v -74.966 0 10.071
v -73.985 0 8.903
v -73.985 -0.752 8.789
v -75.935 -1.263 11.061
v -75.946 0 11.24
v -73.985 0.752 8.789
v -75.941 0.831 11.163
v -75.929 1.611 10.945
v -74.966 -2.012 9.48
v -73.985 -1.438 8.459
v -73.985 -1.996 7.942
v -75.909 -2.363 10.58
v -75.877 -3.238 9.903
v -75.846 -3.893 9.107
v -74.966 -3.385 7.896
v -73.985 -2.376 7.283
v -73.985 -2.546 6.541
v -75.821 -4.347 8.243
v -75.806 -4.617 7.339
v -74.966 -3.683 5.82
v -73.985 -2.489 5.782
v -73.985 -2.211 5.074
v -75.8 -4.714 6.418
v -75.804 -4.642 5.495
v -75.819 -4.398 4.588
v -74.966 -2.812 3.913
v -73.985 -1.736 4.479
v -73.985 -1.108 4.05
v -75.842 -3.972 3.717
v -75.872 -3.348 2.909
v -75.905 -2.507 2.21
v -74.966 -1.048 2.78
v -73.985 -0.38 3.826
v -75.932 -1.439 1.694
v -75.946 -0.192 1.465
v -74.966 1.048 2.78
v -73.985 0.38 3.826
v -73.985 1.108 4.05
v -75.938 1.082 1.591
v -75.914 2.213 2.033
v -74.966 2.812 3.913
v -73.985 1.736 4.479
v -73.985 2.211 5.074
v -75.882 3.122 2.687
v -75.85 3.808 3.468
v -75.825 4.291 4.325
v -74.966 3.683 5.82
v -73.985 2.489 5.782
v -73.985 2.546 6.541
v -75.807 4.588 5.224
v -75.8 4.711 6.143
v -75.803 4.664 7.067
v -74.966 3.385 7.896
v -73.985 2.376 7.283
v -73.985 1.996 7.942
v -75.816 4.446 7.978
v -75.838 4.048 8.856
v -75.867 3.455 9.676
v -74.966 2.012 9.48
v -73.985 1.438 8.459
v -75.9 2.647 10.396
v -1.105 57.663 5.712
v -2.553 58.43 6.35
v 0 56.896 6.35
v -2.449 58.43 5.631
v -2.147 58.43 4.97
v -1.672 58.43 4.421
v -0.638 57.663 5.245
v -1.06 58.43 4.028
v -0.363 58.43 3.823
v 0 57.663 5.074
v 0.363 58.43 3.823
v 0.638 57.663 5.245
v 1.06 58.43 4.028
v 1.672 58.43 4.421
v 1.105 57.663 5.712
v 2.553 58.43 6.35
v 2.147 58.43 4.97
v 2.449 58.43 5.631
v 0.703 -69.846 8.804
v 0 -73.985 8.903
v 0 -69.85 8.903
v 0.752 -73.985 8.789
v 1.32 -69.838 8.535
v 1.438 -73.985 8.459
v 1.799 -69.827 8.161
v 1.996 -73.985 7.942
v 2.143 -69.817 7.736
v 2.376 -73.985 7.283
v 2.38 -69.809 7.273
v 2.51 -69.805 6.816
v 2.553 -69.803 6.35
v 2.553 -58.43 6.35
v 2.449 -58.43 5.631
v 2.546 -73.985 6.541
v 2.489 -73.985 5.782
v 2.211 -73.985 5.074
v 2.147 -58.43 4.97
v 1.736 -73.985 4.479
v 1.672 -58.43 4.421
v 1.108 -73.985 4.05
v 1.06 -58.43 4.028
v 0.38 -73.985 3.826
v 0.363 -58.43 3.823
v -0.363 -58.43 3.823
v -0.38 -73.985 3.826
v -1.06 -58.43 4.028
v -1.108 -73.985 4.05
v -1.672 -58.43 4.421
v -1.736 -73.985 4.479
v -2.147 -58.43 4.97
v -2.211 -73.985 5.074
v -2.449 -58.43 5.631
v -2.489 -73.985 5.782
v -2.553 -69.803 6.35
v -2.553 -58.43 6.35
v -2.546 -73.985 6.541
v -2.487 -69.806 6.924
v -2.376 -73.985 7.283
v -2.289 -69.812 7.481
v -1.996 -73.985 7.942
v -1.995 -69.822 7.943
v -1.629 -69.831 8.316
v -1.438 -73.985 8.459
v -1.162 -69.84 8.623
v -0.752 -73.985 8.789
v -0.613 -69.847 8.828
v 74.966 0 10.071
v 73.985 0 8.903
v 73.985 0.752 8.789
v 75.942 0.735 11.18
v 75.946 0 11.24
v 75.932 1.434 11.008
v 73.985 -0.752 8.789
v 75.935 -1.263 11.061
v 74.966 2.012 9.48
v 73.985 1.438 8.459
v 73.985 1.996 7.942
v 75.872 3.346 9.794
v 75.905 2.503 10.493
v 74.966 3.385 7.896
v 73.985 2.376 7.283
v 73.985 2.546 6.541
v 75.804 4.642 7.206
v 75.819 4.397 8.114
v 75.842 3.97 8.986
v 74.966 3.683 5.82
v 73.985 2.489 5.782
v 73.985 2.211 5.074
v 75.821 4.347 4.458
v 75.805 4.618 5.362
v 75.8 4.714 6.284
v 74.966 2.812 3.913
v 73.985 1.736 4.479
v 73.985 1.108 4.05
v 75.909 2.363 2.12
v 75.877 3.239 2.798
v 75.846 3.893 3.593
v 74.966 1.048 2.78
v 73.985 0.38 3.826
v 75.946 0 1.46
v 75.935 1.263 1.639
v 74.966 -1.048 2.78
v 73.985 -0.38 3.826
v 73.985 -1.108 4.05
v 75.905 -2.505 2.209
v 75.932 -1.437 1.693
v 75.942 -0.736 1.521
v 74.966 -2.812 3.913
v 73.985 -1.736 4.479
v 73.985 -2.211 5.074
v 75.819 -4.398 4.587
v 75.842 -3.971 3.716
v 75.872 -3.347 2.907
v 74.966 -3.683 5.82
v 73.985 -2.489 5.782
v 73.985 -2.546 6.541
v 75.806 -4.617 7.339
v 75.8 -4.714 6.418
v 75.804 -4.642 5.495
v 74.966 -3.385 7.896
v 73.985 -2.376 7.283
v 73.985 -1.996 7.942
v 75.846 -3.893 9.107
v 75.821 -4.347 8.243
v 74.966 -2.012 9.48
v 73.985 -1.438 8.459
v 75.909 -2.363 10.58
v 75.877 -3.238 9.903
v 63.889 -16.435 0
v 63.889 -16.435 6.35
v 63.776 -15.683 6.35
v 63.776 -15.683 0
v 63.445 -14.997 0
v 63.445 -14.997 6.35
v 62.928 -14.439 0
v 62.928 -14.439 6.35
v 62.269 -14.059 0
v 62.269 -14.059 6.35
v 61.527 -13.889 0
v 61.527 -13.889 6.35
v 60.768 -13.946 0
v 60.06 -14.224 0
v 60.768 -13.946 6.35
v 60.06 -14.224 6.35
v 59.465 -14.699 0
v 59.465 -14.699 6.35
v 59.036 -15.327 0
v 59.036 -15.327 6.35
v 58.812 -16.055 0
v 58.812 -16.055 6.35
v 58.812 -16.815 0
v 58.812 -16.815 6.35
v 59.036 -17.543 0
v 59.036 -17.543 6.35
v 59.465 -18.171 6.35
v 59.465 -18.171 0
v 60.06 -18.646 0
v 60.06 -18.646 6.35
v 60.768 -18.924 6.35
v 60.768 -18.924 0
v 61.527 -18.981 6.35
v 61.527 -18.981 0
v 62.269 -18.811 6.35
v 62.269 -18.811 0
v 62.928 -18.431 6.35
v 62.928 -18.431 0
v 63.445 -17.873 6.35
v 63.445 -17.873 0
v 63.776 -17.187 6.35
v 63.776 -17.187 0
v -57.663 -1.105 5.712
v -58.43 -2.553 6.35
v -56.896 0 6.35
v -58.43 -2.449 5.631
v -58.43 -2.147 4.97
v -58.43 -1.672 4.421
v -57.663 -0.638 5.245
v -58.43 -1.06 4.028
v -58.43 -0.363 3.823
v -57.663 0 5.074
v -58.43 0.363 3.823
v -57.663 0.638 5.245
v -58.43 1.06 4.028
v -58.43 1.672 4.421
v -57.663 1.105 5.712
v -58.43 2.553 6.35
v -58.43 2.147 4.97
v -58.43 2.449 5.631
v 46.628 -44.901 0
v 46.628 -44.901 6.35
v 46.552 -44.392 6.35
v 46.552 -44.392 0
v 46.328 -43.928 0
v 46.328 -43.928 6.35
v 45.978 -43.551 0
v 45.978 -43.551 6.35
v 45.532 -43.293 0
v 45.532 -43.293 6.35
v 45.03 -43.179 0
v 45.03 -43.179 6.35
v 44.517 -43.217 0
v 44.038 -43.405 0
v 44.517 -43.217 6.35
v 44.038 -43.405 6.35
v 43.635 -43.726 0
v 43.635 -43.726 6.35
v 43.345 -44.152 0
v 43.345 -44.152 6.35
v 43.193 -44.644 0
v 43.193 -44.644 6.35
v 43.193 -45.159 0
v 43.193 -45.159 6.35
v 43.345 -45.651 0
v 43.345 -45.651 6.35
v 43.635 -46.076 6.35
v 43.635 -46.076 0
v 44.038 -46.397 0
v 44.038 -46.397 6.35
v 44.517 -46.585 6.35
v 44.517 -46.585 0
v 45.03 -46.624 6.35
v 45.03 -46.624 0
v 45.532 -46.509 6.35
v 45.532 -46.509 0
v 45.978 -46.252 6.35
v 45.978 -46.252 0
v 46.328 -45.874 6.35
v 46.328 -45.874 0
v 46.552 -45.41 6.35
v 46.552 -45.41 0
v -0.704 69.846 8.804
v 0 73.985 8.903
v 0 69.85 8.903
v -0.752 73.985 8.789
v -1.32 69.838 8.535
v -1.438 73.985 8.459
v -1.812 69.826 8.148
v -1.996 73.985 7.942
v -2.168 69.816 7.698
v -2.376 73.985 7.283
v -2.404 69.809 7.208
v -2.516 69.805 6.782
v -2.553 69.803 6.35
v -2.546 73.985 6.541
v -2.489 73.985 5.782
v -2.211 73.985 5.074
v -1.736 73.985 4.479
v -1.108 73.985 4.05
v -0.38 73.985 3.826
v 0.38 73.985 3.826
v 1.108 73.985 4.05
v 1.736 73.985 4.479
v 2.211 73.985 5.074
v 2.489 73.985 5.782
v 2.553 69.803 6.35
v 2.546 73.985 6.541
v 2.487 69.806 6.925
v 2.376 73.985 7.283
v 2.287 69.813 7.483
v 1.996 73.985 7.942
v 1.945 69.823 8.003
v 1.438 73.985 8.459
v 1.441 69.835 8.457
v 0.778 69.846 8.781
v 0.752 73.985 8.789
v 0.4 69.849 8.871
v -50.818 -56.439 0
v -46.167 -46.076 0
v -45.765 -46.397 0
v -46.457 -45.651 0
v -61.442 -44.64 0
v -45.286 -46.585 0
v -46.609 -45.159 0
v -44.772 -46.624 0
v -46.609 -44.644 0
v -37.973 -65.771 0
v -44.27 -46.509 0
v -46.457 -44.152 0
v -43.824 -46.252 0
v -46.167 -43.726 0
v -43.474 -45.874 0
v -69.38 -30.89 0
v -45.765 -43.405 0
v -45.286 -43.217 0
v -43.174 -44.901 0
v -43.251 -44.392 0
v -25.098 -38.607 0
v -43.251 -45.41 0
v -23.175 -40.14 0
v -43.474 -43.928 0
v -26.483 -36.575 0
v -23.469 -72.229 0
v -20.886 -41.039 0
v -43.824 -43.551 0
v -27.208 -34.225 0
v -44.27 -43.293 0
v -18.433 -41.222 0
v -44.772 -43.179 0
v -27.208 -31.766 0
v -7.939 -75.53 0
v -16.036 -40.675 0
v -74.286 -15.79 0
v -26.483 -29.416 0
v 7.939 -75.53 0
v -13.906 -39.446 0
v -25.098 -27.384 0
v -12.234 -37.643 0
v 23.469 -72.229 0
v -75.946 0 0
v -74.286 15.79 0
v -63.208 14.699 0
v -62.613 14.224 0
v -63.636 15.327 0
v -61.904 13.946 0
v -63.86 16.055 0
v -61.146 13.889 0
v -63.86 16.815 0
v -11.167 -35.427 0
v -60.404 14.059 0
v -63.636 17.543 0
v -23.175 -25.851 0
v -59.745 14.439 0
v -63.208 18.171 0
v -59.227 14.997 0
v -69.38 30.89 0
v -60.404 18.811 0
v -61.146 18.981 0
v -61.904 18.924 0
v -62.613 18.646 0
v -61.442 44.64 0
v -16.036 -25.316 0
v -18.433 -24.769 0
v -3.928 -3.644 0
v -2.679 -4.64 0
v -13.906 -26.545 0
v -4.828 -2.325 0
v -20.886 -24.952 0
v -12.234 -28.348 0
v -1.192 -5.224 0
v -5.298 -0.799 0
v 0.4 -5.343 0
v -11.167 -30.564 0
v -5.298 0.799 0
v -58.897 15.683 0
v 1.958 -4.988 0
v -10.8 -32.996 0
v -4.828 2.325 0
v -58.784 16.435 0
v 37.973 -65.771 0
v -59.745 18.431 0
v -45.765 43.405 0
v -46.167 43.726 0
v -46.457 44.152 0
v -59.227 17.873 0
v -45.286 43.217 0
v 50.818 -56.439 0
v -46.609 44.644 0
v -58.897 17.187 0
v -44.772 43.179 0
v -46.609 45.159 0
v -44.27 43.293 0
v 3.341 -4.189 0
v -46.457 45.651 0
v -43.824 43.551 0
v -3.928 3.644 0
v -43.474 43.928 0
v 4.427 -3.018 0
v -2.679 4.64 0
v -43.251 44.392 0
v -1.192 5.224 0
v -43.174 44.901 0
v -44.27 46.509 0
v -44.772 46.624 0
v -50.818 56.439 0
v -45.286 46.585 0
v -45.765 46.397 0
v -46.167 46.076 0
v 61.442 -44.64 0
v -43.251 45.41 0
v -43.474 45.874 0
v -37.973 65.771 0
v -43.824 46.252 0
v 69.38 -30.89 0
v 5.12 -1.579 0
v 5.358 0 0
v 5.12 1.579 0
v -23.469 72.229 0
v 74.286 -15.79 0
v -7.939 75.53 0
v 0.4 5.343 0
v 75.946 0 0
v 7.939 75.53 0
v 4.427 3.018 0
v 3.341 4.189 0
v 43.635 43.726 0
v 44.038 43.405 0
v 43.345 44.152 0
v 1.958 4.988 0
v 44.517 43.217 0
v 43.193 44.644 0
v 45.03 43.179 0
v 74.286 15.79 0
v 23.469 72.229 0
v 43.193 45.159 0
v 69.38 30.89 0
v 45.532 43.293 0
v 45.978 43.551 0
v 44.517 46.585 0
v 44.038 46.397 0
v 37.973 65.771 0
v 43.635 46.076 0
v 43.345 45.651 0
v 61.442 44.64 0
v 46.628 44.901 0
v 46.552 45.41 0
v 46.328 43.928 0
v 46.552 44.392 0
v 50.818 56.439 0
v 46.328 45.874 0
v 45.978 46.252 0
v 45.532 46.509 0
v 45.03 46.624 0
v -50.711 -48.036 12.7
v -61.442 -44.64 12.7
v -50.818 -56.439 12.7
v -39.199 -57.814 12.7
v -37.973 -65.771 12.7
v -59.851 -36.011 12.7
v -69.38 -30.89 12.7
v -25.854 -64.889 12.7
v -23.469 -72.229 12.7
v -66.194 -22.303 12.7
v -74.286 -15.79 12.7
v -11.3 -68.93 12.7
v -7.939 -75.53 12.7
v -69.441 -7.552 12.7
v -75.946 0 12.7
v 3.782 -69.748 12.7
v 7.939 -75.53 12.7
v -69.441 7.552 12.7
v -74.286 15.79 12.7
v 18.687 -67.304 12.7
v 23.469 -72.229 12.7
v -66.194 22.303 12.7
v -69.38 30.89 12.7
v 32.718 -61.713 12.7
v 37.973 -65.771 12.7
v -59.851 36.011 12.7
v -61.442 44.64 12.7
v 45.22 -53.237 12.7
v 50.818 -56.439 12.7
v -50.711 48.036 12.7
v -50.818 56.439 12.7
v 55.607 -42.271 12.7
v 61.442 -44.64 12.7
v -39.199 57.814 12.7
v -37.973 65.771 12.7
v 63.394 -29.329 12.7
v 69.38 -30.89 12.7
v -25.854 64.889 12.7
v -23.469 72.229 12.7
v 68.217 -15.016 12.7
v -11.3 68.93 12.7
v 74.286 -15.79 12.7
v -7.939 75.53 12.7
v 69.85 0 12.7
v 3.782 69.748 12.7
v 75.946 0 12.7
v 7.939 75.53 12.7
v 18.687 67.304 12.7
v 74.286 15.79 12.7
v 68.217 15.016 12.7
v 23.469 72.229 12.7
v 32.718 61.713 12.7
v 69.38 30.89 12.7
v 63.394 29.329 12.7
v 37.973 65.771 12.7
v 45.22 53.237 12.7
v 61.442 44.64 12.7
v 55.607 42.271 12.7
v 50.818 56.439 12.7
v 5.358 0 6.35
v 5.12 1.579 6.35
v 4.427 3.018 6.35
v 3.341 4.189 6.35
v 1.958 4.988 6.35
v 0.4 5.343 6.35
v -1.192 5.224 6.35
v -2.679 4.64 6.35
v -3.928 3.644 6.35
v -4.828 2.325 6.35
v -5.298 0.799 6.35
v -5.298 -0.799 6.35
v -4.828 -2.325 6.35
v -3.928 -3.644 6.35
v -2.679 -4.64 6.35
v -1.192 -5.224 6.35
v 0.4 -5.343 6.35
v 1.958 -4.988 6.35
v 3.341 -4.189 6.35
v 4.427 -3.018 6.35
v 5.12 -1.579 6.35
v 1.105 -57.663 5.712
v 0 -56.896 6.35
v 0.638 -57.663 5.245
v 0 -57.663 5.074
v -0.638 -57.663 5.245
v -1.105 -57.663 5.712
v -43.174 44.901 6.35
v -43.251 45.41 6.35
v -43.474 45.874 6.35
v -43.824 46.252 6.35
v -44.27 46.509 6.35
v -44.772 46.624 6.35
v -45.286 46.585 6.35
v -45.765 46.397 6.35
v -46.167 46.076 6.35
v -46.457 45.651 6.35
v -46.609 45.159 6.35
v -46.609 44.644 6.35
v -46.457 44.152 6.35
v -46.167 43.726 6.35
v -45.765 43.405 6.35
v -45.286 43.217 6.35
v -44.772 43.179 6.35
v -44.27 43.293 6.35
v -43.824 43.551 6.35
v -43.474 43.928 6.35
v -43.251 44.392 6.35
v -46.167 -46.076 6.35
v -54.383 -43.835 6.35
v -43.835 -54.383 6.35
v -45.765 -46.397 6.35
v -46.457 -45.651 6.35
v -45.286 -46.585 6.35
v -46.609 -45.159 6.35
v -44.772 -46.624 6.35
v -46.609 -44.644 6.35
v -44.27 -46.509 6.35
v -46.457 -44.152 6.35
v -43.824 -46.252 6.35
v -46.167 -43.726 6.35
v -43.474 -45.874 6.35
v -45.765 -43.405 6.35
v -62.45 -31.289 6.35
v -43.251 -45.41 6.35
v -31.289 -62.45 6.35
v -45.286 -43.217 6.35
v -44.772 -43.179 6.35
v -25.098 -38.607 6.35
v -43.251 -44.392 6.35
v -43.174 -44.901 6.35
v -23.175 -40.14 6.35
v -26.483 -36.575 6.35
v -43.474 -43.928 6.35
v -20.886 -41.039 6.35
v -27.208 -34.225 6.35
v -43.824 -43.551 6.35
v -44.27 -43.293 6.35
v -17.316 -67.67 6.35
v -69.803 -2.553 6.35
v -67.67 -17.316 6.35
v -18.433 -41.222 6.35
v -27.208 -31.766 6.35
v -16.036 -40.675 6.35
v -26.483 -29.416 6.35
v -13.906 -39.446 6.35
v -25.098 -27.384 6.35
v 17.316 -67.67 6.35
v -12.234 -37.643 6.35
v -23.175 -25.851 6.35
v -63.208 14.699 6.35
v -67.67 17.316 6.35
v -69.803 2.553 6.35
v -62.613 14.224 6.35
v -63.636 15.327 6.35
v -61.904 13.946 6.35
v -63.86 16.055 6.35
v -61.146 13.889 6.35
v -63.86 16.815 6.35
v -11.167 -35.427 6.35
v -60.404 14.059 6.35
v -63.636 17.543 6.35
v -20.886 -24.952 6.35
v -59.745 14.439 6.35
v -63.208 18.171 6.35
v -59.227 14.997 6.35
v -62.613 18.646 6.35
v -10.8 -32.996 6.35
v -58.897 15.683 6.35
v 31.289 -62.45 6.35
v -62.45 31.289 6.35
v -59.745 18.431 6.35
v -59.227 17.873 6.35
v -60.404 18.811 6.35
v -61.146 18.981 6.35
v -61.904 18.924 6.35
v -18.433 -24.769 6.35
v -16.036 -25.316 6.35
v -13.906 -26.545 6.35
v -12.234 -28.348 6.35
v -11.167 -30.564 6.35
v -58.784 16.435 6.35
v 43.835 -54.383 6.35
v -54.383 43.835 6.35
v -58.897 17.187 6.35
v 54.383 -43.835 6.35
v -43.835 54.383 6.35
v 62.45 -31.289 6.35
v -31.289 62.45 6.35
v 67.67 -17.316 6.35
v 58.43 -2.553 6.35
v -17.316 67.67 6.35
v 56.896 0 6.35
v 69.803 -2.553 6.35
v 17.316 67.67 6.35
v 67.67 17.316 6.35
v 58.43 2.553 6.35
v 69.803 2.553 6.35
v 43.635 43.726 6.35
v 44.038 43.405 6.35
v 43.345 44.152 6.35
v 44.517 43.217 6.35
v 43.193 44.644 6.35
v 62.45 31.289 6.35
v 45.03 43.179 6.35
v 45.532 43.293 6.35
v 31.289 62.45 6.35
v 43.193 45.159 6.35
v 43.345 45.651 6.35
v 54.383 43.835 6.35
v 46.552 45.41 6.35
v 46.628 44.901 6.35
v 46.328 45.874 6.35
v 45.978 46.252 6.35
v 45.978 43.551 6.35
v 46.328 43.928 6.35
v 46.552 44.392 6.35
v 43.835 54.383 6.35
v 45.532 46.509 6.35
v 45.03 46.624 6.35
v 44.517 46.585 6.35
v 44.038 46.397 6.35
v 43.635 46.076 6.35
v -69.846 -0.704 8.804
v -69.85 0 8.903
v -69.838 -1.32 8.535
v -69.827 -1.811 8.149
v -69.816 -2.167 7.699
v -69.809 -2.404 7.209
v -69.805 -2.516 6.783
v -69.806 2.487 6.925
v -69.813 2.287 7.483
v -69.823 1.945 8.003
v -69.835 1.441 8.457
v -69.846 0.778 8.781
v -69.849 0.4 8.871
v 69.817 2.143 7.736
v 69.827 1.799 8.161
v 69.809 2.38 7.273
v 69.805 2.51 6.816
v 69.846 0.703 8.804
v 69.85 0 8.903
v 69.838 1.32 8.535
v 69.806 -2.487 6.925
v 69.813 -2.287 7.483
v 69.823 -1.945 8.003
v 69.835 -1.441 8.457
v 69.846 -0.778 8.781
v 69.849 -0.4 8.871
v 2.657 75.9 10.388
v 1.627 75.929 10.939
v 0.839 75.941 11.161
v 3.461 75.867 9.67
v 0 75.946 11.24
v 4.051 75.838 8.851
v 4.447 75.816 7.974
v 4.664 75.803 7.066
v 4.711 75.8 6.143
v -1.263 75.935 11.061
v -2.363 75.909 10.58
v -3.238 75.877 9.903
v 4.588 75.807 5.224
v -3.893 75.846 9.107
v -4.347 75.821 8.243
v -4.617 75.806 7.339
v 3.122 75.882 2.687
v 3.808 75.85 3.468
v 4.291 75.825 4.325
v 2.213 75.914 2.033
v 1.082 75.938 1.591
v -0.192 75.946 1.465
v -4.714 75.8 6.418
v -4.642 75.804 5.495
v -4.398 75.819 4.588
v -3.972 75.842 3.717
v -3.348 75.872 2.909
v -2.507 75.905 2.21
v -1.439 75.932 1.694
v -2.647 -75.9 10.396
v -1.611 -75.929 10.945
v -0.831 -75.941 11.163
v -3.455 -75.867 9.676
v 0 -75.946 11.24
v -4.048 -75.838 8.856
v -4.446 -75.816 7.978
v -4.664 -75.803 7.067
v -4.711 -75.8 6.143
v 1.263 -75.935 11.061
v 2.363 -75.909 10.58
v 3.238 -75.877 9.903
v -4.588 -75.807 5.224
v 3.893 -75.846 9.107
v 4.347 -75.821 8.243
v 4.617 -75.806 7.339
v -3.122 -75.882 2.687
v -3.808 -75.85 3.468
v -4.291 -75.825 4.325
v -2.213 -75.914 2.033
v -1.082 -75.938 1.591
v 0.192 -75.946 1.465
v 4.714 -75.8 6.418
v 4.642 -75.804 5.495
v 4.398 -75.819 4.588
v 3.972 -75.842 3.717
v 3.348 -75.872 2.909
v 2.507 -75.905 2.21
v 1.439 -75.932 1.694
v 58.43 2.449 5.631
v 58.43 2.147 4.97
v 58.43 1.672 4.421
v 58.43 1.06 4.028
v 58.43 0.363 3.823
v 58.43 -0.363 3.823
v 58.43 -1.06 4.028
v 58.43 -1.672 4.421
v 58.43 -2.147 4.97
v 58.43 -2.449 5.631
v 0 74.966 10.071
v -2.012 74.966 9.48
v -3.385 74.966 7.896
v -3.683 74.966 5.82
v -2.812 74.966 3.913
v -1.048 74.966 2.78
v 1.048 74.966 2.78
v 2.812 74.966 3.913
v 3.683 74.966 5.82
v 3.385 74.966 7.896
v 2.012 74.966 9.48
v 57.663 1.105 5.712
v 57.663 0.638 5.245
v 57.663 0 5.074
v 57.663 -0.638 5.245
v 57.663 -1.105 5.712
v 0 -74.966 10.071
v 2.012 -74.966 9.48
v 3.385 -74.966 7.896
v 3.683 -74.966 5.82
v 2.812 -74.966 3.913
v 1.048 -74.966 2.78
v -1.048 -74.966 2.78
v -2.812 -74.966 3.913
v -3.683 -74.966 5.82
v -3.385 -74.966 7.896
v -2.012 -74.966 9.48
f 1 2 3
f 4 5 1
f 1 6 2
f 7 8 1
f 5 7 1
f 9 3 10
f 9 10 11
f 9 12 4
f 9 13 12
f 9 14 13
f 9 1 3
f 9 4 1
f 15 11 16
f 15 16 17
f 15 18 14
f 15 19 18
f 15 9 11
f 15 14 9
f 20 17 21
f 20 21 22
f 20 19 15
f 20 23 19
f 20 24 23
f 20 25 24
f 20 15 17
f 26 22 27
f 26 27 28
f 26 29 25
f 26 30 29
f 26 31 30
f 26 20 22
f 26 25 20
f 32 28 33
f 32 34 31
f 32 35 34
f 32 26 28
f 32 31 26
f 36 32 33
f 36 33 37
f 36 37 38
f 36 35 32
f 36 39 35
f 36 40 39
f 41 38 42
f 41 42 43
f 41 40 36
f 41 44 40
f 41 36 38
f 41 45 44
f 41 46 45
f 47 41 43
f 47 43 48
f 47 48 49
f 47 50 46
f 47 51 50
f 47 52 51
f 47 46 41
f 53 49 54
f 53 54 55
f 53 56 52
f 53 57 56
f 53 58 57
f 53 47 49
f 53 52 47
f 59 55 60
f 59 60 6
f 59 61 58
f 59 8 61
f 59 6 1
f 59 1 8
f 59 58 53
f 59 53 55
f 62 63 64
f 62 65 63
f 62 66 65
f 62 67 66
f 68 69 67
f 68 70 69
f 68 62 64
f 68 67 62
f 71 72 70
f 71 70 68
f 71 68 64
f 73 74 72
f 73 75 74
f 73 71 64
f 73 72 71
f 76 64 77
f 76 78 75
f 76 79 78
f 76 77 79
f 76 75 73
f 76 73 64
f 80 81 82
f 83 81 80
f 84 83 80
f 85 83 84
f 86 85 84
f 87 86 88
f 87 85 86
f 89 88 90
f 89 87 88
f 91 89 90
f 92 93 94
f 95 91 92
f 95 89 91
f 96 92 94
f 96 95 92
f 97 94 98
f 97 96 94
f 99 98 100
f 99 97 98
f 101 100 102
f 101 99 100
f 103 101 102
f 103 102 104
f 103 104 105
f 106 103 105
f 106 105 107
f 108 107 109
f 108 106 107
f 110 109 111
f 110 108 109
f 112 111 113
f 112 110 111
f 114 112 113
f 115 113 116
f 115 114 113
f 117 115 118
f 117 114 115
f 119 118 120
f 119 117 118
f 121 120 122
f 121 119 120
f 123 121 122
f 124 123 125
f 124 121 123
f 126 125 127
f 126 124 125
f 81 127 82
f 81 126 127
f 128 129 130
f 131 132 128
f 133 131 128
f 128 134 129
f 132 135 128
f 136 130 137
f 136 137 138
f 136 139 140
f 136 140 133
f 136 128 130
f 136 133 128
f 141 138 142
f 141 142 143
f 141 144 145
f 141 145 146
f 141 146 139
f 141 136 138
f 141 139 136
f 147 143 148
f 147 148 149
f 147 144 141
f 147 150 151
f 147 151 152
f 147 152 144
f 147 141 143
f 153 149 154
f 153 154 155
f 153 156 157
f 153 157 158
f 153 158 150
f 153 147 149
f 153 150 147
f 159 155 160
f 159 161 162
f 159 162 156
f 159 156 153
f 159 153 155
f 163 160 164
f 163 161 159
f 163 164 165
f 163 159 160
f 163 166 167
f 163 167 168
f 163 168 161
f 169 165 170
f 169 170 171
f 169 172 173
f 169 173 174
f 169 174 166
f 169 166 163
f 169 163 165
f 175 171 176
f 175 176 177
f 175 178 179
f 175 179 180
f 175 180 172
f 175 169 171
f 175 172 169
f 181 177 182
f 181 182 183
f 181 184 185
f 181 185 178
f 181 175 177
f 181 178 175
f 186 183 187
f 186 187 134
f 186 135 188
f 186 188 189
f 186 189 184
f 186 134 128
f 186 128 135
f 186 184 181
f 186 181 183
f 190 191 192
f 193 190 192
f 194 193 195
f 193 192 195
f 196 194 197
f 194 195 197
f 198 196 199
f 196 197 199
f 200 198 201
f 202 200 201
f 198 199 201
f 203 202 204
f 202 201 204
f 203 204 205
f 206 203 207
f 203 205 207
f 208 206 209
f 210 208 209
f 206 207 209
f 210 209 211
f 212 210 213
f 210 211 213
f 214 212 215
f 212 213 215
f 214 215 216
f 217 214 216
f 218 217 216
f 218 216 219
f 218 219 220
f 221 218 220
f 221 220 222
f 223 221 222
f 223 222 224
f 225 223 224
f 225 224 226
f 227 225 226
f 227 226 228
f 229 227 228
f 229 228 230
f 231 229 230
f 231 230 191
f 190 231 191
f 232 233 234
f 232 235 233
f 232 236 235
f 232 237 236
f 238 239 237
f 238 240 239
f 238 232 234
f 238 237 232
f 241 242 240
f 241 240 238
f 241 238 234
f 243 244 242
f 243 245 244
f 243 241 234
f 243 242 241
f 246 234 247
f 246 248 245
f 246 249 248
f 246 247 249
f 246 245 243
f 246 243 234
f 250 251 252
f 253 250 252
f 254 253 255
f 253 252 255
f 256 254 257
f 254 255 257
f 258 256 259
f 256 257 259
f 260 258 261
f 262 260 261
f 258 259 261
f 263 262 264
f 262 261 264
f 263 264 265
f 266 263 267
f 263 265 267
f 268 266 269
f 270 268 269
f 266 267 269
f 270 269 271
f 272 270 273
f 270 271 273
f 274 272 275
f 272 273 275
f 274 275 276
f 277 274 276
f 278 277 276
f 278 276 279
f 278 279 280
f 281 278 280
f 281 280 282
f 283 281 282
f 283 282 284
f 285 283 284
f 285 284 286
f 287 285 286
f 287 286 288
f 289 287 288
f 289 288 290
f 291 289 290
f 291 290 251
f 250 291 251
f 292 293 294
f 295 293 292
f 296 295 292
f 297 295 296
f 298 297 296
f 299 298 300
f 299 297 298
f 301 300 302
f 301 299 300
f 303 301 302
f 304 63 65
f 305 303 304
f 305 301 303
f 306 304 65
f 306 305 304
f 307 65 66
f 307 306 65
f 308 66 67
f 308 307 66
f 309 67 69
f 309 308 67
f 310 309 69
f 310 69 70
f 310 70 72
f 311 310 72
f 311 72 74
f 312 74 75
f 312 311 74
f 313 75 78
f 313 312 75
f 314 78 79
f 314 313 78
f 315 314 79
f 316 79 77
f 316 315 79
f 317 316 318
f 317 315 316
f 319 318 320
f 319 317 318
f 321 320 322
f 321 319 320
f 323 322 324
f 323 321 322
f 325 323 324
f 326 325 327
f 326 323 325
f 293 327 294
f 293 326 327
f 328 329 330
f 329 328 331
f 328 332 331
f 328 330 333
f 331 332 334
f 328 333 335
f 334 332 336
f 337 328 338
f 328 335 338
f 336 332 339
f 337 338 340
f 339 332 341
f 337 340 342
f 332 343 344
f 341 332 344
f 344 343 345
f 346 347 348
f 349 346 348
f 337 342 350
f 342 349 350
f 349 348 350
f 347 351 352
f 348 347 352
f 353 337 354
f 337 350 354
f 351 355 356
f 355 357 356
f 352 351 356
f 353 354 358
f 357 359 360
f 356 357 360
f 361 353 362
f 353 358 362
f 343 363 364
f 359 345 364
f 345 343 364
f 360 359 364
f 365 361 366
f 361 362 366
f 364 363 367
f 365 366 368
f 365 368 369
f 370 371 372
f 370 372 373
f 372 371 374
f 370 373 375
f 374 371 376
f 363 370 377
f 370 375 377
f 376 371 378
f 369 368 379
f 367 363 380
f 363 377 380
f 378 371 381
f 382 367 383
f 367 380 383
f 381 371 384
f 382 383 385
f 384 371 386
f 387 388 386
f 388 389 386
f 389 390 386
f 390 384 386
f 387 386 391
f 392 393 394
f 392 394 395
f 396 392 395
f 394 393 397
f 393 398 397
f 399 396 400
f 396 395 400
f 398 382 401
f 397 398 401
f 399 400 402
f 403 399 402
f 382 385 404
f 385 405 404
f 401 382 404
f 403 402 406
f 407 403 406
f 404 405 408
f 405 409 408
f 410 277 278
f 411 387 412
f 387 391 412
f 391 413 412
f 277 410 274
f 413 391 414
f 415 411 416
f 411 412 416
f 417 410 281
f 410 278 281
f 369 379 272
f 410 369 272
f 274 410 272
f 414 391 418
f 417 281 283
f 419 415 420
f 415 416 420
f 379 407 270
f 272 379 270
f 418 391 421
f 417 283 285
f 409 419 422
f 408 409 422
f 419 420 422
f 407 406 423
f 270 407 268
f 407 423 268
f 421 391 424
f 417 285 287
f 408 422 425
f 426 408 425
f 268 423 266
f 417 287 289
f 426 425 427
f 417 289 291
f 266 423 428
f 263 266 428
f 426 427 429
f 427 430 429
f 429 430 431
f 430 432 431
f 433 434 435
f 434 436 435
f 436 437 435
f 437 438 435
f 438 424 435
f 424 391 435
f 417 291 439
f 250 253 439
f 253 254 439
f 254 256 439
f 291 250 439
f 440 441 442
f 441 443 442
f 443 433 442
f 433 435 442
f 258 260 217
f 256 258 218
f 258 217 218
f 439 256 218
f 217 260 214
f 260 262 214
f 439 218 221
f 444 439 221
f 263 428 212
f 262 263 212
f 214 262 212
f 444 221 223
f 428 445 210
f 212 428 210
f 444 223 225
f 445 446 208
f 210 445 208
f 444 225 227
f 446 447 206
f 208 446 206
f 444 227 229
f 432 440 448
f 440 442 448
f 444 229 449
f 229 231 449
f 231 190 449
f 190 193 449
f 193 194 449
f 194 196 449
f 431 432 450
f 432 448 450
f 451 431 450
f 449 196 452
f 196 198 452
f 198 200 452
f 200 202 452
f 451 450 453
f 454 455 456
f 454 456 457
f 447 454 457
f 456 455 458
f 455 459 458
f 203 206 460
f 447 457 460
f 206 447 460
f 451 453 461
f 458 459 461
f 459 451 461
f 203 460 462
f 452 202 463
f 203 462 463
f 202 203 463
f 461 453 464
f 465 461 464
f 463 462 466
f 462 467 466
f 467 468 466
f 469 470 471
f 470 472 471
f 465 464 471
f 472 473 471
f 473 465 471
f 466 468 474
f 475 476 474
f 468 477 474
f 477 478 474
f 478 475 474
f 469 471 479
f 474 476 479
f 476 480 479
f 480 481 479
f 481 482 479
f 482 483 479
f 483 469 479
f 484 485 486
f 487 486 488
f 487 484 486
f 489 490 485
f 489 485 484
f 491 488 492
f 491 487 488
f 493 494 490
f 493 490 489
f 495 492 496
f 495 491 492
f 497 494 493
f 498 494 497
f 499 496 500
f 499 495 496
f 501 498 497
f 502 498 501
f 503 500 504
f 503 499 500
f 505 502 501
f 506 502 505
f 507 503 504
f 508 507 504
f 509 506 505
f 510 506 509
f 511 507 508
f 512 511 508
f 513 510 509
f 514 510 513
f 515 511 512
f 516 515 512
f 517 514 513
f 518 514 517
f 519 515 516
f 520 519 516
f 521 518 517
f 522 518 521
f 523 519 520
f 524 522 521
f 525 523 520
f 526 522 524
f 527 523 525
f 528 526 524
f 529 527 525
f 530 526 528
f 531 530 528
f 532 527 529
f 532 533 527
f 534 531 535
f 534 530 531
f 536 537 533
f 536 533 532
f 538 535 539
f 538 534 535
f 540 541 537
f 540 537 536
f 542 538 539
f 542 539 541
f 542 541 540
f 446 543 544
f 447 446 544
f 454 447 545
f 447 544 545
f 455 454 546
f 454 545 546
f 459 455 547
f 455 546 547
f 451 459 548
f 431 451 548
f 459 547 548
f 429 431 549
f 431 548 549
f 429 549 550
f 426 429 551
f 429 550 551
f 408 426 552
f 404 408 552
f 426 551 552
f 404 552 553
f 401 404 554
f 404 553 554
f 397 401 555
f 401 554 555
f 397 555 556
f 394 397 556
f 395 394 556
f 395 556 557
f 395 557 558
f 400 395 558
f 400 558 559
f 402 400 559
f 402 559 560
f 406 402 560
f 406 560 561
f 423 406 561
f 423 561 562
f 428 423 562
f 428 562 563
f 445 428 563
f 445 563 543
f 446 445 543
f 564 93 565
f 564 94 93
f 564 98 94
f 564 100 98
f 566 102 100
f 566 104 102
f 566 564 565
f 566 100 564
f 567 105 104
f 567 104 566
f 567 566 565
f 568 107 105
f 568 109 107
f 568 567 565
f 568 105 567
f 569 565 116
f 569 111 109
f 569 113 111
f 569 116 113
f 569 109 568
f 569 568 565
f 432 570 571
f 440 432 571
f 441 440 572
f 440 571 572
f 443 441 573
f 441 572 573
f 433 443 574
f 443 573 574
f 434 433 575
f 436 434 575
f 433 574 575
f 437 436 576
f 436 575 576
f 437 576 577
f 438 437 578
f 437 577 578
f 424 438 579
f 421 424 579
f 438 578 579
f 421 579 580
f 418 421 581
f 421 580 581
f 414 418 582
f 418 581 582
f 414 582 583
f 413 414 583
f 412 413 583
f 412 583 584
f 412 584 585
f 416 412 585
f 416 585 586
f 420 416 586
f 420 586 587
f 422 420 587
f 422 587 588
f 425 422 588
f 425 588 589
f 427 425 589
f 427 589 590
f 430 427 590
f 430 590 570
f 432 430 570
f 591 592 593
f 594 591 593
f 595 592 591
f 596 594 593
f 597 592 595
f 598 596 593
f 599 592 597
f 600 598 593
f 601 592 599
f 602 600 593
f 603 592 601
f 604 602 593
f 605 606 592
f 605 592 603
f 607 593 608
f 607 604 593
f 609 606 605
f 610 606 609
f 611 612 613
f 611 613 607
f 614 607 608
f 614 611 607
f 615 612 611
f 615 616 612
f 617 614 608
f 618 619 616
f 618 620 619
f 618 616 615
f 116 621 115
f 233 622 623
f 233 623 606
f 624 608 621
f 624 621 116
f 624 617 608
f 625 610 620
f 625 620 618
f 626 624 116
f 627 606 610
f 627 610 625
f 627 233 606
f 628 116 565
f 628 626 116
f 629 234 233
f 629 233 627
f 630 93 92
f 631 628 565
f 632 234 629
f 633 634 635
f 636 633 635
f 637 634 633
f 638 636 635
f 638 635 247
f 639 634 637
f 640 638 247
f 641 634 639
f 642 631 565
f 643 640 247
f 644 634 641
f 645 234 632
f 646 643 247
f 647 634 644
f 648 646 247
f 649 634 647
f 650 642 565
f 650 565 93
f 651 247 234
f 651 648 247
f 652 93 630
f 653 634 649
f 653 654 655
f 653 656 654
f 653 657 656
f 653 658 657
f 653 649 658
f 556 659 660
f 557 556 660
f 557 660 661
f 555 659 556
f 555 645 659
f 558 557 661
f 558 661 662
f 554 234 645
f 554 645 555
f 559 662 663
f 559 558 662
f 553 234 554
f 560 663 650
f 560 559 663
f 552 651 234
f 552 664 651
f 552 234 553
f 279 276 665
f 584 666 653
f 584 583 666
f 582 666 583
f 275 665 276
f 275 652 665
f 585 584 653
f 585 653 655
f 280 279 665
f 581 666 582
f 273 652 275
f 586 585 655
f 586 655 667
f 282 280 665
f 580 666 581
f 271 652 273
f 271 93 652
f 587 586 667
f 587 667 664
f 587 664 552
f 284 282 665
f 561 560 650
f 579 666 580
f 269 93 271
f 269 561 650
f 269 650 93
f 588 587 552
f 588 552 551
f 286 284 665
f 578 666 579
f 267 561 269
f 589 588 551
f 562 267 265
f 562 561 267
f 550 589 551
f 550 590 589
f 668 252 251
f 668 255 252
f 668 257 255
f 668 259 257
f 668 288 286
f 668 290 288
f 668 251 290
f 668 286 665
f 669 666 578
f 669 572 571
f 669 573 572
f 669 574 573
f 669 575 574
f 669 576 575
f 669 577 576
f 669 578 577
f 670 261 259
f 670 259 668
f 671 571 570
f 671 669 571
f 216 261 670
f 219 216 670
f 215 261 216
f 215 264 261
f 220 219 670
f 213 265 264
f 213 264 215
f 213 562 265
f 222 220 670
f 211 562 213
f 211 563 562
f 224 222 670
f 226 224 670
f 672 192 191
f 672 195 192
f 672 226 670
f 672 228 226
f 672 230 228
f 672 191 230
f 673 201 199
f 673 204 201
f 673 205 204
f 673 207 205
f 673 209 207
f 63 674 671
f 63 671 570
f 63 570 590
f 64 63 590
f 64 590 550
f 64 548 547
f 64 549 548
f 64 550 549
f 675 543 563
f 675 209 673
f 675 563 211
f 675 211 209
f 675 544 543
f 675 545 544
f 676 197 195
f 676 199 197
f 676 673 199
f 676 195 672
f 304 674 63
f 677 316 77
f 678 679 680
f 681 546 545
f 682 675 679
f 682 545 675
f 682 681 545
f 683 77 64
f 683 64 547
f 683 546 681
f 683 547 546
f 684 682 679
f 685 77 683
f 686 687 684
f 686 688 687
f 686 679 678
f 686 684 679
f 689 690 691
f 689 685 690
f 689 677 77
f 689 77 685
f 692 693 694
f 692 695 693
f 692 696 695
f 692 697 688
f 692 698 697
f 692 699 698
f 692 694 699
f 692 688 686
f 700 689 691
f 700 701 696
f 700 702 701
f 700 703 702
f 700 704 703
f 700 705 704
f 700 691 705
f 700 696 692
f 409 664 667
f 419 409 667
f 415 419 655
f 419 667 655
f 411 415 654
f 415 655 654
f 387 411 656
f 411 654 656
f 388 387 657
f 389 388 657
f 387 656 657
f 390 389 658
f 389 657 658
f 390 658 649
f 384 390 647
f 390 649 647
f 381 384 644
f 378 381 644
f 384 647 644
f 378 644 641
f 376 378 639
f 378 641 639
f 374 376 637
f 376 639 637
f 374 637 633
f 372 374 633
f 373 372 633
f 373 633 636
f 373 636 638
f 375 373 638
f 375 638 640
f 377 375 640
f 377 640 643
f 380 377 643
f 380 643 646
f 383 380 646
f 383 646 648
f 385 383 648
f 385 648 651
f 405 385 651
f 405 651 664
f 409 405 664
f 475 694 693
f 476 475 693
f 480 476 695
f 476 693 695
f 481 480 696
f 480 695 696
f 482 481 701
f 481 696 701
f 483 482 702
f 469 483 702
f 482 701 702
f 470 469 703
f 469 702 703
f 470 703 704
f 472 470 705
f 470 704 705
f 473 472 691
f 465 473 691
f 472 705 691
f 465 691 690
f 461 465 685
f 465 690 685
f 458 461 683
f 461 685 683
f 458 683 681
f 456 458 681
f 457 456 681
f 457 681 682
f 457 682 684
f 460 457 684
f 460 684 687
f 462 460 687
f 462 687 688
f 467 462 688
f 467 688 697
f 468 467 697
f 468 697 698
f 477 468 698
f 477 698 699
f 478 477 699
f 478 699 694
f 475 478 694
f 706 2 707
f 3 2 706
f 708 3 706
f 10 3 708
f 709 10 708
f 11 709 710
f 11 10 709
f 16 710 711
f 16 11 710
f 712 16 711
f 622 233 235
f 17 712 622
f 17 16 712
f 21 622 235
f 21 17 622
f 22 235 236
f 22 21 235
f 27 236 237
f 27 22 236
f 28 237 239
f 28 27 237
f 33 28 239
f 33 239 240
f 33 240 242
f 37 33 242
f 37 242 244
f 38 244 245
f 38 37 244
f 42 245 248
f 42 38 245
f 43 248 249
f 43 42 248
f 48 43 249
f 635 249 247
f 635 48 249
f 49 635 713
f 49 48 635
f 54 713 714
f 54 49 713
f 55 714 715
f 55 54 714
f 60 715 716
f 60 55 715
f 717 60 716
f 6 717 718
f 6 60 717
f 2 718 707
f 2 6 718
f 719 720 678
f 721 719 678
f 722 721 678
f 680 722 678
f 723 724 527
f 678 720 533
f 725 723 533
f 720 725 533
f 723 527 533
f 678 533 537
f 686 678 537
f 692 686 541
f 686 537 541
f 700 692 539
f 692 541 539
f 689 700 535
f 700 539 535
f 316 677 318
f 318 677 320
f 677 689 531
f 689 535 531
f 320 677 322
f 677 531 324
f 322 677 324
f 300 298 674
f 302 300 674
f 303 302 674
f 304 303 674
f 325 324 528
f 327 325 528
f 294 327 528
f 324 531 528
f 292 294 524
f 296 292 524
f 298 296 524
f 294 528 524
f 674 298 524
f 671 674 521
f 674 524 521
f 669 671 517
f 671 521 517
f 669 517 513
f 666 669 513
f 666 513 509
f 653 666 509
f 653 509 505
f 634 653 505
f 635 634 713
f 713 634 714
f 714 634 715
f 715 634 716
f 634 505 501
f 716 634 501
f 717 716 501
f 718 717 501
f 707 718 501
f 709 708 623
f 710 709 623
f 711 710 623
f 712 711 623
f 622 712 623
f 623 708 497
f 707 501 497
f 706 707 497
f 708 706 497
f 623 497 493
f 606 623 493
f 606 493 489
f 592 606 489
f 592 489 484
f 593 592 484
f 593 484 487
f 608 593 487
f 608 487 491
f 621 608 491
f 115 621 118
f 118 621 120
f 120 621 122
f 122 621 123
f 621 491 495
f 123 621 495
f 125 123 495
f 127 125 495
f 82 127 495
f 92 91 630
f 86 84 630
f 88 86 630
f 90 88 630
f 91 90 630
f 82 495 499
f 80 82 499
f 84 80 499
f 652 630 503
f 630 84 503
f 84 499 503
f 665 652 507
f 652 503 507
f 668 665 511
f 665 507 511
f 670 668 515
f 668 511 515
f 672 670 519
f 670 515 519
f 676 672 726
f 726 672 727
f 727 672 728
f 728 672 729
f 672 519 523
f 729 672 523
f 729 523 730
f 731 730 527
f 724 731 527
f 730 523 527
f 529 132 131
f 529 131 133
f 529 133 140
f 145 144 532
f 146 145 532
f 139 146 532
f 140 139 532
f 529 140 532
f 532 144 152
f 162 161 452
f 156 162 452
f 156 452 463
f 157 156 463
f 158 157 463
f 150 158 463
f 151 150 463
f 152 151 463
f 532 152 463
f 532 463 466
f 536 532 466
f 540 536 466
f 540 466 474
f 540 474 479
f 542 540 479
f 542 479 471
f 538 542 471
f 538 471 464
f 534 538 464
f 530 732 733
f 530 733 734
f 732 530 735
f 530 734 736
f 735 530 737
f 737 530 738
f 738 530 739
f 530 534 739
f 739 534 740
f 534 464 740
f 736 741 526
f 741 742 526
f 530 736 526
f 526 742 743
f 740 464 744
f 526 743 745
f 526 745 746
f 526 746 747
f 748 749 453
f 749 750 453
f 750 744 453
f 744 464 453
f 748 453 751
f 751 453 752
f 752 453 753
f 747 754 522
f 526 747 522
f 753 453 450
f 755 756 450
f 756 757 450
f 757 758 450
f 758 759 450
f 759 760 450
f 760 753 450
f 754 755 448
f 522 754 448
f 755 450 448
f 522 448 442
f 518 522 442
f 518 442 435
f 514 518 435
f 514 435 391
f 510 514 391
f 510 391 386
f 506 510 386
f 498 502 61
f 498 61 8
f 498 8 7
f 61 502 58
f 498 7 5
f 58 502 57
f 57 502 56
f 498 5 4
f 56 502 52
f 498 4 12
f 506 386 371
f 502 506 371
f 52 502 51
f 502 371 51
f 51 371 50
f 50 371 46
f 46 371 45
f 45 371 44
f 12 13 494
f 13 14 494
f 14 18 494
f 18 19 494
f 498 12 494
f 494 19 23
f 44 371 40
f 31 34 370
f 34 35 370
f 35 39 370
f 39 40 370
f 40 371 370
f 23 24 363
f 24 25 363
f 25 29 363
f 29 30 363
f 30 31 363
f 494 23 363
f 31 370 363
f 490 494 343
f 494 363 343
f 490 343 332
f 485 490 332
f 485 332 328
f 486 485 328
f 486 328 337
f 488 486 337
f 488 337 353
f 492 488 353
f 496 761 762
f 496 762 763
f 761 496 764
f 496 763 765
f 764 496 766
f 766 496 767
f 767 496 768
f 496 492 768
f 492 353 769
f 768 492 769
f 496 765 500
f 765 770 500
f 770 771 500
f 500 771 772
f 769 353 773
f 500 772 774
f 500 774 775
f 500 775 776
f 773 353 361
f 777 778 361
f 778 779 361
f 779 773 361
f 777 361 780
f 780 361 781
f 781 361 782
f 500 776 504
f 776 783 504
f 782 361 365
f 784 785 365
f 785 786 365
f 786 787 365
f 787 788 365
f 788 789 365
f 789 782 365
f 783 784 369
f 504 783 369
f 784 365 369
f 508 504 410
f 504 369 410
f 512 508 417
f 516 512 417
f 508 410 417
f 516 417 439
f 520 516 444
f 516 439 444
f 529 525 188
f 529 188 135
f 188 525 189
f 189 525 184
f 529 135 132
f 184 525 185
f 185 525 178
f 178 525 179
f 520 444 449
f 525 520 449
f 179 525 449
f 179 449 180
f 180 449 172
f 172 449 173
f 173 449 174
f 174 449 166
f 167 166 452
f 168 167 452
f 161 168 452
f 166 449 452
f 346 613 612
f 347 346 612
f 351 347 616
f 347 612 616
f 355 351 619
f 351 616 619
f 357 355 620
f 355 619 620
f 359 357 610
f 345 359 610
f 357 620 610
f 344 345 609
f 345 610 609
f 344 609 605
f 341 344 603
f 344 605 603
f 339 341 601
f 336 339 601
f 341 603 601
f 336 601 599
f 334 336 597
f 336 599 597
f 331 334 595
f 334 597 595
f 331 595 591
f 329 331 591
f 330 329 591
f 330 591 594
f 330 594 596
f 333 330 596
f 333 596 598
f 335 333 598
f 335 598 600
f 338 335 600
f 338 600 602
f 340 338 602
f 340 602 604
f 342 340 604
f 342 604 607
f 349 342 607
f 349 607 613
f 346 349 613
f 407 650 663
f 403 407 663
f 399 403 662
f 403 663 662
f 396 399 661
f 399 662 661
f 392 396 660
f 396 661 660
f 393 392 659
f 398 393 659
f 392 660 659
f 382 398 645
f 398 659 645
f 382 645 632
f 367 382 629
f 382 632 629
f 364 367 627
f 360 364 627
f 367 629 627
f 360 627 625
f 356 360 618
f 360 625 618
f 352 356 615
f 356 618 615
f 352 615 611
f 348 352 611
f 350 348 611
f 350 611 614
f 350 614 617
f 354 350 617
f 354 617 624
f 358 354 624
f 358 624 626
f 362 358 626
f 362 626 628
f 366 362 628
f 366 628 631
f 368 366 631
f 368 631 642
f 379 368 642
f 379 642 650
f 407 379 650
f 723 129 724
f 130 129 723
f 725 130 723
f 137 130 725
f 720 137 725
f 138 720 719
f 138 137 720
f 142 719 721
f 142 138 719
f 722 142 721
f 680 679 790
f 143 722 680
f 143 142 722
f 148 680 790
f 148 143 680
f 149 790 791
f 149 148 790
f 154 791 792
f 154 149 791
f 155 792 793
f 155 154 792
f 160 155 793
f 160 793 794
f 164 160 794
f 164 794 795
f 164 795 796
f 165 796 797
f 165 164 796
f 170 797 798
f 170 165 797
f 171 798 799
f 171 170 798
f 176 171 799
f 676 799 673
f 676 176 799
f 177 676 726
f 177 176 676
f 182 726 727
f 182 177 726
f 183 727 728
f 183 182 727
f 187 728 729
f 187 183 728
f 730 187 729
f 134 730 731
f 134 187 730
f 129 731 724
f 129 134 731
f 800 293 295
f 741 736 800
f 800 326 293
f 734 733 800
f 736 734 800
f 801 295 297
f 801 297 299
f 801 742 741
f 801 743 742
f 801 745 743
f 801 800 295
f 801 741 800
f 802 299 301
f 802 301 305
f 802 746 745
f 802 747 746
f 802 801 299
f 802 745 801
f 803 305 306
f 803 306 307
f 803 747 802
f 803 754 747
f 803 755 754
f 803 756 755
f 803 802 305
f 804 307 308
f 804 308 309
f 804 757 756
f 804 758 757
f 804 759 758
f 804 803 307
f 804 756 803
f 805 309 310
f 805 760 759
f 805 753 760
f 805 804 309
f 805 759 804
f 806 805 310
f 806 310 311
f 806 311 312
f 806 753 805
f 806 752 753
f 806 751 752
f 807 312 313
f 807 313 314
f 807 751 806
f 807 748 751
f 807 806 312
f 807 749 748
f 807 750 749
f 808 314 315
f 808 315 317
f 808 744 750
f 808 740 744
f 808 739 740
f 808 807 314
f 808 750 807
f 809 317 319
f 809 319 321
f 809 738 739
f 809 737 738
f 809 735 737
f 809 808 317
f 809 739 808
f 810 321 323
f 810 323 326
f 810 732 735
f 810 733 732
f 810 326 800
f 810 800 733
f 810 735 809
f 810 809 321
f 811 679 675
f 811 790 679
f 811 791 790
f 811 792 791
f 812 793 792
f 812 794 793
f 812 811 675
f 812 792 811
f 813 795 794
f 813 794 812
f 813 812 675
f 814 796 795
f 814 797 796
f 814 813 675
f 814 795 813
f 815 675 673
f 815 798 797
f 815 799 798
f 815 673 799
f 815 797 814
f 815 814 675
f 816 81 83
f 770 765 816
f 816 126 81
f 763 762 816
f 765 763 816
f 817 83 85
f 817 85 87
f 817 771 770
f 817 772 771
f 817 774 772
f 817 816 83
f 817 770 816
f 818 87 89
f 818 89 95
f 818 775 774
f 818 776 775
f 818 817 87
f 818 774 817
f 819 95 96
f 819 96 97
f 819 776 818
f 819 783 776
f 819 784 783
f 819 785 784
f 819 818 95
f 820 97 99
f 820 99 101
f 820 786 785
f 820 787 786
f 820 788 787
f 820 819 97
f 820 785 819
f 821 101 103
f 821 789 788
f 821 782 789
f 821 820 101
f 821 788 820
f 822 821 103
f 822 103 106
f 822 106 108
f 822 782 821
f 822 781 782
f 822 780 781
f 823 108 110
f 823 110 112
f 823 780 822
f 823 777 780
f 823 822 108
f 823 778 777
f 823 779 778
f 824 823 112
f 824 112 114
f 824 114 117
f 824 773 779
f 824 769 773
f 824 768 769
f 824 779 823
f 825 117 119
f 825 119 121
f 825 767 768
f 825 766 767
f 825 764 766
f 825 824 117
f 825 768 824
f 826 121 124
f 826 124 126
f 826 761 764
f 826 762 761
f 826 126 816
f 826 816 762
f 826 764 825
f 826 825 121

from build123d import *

# Parameters (mm, degrees)
SKETCH1_R           = 75.946
BOSS_EXTRUDE1_DEPTH = 12.7
SKETCH2_R           = 69.85
CUT_EXTRUDE1_DEPTH  = 6.35
SKETCH3_R           = 5.35813
SKETCH3_R_2         = 8.2499962
SKETCH3_R_3         = 2.5527
SKETCH3_R_4         = 1.7272
CUT_EXTRUDE2_DEPTH  = 108.59141384
CIRPATTERN1_COUNT   = 4


with BuildPart() as part:
    # Sketch1 → Boss-Extrude1 (new body)
    with BuildSketch(Plane.XY):
        Circle(SKETCH1_R)
    extrude(amount=BOSS_EXTRUDE1_DEPTH)

    # Sketch2 → Cut-Extrude1 (cut)
    with BuildSketch(Plane.XY.offset(12.7)):
        Circle(SKETCH2_R)
    extrude(amount=-CUT_EXTRUDE1_DEPTH, mode=Mode.SUBTRACT)

    # Sketch3 → Cut-Extrude2 (cut, through all)
    with BuildSketch(Plane.XY.offset(6.35)):
        Circle(SKETCH3_R)
        with Locations((-19.05, -32.995567884)):
            Circle(SKETCH3_R_2)
        with Locations((-61.336289969, 16.435009364)):
            Circle(SKETCH3_R_3)
        with Locations((61.336289969, -16.435009364)):
            Circle(SKETCH3_R_3)
        with Locations((44.901280605, 44.901280605)):
            Circle(SKETCH3_R_4)
        with Locations((-44.901280605, 44.901280605)):
            Circle(SKETCH3_R_4)
        with Locations((-44.901280605, -44.901280605)):
            Circle(SKETCH3_R_4)
        with Locations((44.901280605, -44.901280605)):
            Circle(SKETCH3_R_4)
    extrude(amount=-CUT_EXTRUDE2_DEPTH, mode=Mode.SUBTRACT)

    # Sketch5 → CSK for #10 Flat Head Machine Screw (100)1 (revolve, cut)
    with BuildSketch(Plane(origin=(0, 75.946, 6.35), x_dir=(0, 0, 1), z_dir=(1, 0, 0))):
        Polygon((0, 0), (0, 19.05), (2.5527, 17.516183098), (2.5527, 1.960808018), (4.8895, 0), align=None)
    csk_for_10_flat_head_machine_screw_100 = revolve(axis=Axis((0, 82.296, 6.35), (0, -1, 0)), mode=Mode.SUBTRACT)

    # CirPattern1: CSK for #10 Flat Head Machine Screw (100)1 ×4 about axis
    cirpattern1_axis = Axis((0, 0, 12.7), (0, 0, 1))
    for i in range(1, CIRPATTERN1_COUNT):
        add(csk_for_10_flat_head_machine_screw_100.rotate(cirpattern1_axis, i * 360 / CIRPATTERN1_COUNT), mode=Mode.SUBTRACT)


solid = part.part
